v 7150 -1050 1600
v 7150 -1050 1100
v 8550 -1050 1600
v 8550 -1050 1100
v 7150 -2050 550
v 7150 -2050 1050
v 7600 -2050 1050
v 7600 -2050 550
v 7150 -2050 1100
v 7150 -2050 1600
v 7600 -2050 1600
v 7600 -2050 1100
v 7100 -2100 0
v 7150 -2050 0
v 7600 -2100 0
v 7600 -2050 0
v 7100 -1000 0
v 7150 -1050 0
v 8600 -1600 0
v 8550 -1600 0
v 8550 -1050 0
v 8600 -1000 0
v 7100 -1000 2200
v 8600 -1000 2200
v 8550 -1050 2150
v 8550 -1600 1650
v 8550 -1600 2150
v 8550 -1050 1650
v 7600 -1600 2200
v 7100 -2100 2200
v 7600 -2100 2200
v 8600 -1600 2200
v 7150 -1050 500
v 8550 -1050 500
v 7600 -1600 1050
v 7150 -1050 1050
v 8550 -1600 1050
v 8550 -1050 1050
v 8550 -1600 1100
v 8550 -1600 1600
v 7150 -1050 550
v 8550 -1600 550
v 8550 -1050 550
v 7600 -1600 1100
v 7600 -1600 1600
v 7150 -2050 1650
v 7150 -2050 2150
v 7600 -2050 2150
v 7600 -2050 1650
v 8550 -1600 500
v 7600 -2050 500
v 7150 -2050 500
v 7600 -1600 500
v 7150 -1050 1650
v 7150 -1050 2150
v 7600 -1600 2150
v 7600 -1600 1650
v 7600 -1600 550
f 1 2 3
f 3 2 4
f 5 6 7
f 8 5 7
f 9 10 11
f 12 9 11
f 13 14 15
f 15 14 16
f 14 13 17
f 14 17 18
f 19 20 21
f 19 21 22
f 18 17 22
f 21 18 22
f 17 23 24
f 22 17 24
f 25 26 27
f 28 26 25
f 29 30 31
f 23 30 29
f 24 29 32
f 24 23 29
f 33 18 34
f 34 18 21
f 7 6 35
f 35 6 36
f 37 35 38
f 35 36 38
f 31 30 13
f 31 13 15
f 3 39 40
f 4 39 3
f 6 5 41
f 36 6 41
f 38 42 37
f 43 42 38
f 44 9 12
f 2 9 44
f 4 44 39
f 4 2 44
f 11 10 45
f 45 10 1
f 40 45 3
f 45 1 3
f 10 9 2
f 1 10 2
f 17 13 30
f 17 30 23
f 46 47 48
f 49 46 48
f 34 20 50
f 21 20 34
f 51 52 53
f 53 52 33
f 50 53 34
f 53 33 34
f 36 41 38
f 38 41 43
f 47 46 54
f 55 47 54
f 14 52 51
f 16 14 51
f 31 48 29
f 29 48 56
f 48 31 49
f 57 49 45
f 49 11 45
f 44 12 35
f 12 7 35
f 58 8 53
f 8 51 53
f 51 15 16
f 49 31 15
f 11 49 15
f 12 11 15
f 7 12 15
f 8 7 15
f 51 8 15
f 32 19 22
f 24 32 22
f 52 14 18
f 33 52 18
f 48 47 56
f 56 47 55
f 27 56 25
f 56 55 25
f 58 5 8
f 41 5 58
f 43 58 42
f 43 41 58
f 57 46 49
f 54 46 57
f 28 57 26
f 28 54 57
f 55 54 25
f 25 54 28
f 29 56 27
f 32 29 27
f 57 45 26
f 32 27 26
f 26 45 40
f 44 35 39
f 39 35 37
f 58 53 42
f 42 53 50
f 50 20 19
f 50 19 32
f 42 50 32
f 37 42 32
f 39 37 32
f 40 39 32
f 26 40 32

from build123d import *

# Parameters (mm, degrees)
BOX3522_W        = 1400
BOX3522_H        = 1000
BOX3522_DEPTH    = 500
ARRAY279_Z_COUNT = 4
ARRAY279_Z_PITCH = 550
BOX3520_W        = 500
BOX3520_H        = 500
BOX3520_DEPTH    = 2200
BOX3521_W        = 1500
BOX3521_H        = 600
BOX3521_DEPTH    = 2200


with BuildPart() as array279:
    # Box3522 → Box3522 (new body)
    with BuildSketch(Plane(origin=(7150, -2050, 0), x_dir=(1, 0, 0), z_dir=(0, 0, 1))):
        with Locations((700, 500)):
            Rectangle(BOX3522_W, BOX3522_H)
    extrude(amount=BOX3522_DEPTH)

    # Array279 Z: Array279 ×4


with BuildPart() as array279_1:
    add(array279.part)
    with Locations(*[(0, 0, i * ARRAY279_Z_PITCH) for i in range(1, ARRAY279_Z_COUNT)]):
        add(array279.part)


with BuildPart() as box3520:
    # Box3520 → Box3520 (new body)
    with BuildSketch(Plane(origin=(7100, -2100, 0), x_dir=(1, 0, 0), z_dir=(0, 0, 1))):
        with Locations((250, 250)):
            Rectangle(BOX3520_W, BOX3520_H)
    extrude(amount=BOX3520_DEPTH)


with BuildPart() as cut001:
    # Box3521 → Box3521 (new body)
    with BuildSketch(Plane(origin=(7100, -1600, 0), x_dir=(1, 0, 0), z_dir=(0, 0, 1))):
        with Locations((750, 300)):
            Rectangle(BOX3521_W, BOX3521_H)
    extrude(amount=BOX3521_DEPTH)

    # Fusion014: union Box3520
    add(box3520.part)

    # Cut001: cut Array279
    add(array279_1.part, mode=Mode.SUBTRACT)


solid = cut001.part
